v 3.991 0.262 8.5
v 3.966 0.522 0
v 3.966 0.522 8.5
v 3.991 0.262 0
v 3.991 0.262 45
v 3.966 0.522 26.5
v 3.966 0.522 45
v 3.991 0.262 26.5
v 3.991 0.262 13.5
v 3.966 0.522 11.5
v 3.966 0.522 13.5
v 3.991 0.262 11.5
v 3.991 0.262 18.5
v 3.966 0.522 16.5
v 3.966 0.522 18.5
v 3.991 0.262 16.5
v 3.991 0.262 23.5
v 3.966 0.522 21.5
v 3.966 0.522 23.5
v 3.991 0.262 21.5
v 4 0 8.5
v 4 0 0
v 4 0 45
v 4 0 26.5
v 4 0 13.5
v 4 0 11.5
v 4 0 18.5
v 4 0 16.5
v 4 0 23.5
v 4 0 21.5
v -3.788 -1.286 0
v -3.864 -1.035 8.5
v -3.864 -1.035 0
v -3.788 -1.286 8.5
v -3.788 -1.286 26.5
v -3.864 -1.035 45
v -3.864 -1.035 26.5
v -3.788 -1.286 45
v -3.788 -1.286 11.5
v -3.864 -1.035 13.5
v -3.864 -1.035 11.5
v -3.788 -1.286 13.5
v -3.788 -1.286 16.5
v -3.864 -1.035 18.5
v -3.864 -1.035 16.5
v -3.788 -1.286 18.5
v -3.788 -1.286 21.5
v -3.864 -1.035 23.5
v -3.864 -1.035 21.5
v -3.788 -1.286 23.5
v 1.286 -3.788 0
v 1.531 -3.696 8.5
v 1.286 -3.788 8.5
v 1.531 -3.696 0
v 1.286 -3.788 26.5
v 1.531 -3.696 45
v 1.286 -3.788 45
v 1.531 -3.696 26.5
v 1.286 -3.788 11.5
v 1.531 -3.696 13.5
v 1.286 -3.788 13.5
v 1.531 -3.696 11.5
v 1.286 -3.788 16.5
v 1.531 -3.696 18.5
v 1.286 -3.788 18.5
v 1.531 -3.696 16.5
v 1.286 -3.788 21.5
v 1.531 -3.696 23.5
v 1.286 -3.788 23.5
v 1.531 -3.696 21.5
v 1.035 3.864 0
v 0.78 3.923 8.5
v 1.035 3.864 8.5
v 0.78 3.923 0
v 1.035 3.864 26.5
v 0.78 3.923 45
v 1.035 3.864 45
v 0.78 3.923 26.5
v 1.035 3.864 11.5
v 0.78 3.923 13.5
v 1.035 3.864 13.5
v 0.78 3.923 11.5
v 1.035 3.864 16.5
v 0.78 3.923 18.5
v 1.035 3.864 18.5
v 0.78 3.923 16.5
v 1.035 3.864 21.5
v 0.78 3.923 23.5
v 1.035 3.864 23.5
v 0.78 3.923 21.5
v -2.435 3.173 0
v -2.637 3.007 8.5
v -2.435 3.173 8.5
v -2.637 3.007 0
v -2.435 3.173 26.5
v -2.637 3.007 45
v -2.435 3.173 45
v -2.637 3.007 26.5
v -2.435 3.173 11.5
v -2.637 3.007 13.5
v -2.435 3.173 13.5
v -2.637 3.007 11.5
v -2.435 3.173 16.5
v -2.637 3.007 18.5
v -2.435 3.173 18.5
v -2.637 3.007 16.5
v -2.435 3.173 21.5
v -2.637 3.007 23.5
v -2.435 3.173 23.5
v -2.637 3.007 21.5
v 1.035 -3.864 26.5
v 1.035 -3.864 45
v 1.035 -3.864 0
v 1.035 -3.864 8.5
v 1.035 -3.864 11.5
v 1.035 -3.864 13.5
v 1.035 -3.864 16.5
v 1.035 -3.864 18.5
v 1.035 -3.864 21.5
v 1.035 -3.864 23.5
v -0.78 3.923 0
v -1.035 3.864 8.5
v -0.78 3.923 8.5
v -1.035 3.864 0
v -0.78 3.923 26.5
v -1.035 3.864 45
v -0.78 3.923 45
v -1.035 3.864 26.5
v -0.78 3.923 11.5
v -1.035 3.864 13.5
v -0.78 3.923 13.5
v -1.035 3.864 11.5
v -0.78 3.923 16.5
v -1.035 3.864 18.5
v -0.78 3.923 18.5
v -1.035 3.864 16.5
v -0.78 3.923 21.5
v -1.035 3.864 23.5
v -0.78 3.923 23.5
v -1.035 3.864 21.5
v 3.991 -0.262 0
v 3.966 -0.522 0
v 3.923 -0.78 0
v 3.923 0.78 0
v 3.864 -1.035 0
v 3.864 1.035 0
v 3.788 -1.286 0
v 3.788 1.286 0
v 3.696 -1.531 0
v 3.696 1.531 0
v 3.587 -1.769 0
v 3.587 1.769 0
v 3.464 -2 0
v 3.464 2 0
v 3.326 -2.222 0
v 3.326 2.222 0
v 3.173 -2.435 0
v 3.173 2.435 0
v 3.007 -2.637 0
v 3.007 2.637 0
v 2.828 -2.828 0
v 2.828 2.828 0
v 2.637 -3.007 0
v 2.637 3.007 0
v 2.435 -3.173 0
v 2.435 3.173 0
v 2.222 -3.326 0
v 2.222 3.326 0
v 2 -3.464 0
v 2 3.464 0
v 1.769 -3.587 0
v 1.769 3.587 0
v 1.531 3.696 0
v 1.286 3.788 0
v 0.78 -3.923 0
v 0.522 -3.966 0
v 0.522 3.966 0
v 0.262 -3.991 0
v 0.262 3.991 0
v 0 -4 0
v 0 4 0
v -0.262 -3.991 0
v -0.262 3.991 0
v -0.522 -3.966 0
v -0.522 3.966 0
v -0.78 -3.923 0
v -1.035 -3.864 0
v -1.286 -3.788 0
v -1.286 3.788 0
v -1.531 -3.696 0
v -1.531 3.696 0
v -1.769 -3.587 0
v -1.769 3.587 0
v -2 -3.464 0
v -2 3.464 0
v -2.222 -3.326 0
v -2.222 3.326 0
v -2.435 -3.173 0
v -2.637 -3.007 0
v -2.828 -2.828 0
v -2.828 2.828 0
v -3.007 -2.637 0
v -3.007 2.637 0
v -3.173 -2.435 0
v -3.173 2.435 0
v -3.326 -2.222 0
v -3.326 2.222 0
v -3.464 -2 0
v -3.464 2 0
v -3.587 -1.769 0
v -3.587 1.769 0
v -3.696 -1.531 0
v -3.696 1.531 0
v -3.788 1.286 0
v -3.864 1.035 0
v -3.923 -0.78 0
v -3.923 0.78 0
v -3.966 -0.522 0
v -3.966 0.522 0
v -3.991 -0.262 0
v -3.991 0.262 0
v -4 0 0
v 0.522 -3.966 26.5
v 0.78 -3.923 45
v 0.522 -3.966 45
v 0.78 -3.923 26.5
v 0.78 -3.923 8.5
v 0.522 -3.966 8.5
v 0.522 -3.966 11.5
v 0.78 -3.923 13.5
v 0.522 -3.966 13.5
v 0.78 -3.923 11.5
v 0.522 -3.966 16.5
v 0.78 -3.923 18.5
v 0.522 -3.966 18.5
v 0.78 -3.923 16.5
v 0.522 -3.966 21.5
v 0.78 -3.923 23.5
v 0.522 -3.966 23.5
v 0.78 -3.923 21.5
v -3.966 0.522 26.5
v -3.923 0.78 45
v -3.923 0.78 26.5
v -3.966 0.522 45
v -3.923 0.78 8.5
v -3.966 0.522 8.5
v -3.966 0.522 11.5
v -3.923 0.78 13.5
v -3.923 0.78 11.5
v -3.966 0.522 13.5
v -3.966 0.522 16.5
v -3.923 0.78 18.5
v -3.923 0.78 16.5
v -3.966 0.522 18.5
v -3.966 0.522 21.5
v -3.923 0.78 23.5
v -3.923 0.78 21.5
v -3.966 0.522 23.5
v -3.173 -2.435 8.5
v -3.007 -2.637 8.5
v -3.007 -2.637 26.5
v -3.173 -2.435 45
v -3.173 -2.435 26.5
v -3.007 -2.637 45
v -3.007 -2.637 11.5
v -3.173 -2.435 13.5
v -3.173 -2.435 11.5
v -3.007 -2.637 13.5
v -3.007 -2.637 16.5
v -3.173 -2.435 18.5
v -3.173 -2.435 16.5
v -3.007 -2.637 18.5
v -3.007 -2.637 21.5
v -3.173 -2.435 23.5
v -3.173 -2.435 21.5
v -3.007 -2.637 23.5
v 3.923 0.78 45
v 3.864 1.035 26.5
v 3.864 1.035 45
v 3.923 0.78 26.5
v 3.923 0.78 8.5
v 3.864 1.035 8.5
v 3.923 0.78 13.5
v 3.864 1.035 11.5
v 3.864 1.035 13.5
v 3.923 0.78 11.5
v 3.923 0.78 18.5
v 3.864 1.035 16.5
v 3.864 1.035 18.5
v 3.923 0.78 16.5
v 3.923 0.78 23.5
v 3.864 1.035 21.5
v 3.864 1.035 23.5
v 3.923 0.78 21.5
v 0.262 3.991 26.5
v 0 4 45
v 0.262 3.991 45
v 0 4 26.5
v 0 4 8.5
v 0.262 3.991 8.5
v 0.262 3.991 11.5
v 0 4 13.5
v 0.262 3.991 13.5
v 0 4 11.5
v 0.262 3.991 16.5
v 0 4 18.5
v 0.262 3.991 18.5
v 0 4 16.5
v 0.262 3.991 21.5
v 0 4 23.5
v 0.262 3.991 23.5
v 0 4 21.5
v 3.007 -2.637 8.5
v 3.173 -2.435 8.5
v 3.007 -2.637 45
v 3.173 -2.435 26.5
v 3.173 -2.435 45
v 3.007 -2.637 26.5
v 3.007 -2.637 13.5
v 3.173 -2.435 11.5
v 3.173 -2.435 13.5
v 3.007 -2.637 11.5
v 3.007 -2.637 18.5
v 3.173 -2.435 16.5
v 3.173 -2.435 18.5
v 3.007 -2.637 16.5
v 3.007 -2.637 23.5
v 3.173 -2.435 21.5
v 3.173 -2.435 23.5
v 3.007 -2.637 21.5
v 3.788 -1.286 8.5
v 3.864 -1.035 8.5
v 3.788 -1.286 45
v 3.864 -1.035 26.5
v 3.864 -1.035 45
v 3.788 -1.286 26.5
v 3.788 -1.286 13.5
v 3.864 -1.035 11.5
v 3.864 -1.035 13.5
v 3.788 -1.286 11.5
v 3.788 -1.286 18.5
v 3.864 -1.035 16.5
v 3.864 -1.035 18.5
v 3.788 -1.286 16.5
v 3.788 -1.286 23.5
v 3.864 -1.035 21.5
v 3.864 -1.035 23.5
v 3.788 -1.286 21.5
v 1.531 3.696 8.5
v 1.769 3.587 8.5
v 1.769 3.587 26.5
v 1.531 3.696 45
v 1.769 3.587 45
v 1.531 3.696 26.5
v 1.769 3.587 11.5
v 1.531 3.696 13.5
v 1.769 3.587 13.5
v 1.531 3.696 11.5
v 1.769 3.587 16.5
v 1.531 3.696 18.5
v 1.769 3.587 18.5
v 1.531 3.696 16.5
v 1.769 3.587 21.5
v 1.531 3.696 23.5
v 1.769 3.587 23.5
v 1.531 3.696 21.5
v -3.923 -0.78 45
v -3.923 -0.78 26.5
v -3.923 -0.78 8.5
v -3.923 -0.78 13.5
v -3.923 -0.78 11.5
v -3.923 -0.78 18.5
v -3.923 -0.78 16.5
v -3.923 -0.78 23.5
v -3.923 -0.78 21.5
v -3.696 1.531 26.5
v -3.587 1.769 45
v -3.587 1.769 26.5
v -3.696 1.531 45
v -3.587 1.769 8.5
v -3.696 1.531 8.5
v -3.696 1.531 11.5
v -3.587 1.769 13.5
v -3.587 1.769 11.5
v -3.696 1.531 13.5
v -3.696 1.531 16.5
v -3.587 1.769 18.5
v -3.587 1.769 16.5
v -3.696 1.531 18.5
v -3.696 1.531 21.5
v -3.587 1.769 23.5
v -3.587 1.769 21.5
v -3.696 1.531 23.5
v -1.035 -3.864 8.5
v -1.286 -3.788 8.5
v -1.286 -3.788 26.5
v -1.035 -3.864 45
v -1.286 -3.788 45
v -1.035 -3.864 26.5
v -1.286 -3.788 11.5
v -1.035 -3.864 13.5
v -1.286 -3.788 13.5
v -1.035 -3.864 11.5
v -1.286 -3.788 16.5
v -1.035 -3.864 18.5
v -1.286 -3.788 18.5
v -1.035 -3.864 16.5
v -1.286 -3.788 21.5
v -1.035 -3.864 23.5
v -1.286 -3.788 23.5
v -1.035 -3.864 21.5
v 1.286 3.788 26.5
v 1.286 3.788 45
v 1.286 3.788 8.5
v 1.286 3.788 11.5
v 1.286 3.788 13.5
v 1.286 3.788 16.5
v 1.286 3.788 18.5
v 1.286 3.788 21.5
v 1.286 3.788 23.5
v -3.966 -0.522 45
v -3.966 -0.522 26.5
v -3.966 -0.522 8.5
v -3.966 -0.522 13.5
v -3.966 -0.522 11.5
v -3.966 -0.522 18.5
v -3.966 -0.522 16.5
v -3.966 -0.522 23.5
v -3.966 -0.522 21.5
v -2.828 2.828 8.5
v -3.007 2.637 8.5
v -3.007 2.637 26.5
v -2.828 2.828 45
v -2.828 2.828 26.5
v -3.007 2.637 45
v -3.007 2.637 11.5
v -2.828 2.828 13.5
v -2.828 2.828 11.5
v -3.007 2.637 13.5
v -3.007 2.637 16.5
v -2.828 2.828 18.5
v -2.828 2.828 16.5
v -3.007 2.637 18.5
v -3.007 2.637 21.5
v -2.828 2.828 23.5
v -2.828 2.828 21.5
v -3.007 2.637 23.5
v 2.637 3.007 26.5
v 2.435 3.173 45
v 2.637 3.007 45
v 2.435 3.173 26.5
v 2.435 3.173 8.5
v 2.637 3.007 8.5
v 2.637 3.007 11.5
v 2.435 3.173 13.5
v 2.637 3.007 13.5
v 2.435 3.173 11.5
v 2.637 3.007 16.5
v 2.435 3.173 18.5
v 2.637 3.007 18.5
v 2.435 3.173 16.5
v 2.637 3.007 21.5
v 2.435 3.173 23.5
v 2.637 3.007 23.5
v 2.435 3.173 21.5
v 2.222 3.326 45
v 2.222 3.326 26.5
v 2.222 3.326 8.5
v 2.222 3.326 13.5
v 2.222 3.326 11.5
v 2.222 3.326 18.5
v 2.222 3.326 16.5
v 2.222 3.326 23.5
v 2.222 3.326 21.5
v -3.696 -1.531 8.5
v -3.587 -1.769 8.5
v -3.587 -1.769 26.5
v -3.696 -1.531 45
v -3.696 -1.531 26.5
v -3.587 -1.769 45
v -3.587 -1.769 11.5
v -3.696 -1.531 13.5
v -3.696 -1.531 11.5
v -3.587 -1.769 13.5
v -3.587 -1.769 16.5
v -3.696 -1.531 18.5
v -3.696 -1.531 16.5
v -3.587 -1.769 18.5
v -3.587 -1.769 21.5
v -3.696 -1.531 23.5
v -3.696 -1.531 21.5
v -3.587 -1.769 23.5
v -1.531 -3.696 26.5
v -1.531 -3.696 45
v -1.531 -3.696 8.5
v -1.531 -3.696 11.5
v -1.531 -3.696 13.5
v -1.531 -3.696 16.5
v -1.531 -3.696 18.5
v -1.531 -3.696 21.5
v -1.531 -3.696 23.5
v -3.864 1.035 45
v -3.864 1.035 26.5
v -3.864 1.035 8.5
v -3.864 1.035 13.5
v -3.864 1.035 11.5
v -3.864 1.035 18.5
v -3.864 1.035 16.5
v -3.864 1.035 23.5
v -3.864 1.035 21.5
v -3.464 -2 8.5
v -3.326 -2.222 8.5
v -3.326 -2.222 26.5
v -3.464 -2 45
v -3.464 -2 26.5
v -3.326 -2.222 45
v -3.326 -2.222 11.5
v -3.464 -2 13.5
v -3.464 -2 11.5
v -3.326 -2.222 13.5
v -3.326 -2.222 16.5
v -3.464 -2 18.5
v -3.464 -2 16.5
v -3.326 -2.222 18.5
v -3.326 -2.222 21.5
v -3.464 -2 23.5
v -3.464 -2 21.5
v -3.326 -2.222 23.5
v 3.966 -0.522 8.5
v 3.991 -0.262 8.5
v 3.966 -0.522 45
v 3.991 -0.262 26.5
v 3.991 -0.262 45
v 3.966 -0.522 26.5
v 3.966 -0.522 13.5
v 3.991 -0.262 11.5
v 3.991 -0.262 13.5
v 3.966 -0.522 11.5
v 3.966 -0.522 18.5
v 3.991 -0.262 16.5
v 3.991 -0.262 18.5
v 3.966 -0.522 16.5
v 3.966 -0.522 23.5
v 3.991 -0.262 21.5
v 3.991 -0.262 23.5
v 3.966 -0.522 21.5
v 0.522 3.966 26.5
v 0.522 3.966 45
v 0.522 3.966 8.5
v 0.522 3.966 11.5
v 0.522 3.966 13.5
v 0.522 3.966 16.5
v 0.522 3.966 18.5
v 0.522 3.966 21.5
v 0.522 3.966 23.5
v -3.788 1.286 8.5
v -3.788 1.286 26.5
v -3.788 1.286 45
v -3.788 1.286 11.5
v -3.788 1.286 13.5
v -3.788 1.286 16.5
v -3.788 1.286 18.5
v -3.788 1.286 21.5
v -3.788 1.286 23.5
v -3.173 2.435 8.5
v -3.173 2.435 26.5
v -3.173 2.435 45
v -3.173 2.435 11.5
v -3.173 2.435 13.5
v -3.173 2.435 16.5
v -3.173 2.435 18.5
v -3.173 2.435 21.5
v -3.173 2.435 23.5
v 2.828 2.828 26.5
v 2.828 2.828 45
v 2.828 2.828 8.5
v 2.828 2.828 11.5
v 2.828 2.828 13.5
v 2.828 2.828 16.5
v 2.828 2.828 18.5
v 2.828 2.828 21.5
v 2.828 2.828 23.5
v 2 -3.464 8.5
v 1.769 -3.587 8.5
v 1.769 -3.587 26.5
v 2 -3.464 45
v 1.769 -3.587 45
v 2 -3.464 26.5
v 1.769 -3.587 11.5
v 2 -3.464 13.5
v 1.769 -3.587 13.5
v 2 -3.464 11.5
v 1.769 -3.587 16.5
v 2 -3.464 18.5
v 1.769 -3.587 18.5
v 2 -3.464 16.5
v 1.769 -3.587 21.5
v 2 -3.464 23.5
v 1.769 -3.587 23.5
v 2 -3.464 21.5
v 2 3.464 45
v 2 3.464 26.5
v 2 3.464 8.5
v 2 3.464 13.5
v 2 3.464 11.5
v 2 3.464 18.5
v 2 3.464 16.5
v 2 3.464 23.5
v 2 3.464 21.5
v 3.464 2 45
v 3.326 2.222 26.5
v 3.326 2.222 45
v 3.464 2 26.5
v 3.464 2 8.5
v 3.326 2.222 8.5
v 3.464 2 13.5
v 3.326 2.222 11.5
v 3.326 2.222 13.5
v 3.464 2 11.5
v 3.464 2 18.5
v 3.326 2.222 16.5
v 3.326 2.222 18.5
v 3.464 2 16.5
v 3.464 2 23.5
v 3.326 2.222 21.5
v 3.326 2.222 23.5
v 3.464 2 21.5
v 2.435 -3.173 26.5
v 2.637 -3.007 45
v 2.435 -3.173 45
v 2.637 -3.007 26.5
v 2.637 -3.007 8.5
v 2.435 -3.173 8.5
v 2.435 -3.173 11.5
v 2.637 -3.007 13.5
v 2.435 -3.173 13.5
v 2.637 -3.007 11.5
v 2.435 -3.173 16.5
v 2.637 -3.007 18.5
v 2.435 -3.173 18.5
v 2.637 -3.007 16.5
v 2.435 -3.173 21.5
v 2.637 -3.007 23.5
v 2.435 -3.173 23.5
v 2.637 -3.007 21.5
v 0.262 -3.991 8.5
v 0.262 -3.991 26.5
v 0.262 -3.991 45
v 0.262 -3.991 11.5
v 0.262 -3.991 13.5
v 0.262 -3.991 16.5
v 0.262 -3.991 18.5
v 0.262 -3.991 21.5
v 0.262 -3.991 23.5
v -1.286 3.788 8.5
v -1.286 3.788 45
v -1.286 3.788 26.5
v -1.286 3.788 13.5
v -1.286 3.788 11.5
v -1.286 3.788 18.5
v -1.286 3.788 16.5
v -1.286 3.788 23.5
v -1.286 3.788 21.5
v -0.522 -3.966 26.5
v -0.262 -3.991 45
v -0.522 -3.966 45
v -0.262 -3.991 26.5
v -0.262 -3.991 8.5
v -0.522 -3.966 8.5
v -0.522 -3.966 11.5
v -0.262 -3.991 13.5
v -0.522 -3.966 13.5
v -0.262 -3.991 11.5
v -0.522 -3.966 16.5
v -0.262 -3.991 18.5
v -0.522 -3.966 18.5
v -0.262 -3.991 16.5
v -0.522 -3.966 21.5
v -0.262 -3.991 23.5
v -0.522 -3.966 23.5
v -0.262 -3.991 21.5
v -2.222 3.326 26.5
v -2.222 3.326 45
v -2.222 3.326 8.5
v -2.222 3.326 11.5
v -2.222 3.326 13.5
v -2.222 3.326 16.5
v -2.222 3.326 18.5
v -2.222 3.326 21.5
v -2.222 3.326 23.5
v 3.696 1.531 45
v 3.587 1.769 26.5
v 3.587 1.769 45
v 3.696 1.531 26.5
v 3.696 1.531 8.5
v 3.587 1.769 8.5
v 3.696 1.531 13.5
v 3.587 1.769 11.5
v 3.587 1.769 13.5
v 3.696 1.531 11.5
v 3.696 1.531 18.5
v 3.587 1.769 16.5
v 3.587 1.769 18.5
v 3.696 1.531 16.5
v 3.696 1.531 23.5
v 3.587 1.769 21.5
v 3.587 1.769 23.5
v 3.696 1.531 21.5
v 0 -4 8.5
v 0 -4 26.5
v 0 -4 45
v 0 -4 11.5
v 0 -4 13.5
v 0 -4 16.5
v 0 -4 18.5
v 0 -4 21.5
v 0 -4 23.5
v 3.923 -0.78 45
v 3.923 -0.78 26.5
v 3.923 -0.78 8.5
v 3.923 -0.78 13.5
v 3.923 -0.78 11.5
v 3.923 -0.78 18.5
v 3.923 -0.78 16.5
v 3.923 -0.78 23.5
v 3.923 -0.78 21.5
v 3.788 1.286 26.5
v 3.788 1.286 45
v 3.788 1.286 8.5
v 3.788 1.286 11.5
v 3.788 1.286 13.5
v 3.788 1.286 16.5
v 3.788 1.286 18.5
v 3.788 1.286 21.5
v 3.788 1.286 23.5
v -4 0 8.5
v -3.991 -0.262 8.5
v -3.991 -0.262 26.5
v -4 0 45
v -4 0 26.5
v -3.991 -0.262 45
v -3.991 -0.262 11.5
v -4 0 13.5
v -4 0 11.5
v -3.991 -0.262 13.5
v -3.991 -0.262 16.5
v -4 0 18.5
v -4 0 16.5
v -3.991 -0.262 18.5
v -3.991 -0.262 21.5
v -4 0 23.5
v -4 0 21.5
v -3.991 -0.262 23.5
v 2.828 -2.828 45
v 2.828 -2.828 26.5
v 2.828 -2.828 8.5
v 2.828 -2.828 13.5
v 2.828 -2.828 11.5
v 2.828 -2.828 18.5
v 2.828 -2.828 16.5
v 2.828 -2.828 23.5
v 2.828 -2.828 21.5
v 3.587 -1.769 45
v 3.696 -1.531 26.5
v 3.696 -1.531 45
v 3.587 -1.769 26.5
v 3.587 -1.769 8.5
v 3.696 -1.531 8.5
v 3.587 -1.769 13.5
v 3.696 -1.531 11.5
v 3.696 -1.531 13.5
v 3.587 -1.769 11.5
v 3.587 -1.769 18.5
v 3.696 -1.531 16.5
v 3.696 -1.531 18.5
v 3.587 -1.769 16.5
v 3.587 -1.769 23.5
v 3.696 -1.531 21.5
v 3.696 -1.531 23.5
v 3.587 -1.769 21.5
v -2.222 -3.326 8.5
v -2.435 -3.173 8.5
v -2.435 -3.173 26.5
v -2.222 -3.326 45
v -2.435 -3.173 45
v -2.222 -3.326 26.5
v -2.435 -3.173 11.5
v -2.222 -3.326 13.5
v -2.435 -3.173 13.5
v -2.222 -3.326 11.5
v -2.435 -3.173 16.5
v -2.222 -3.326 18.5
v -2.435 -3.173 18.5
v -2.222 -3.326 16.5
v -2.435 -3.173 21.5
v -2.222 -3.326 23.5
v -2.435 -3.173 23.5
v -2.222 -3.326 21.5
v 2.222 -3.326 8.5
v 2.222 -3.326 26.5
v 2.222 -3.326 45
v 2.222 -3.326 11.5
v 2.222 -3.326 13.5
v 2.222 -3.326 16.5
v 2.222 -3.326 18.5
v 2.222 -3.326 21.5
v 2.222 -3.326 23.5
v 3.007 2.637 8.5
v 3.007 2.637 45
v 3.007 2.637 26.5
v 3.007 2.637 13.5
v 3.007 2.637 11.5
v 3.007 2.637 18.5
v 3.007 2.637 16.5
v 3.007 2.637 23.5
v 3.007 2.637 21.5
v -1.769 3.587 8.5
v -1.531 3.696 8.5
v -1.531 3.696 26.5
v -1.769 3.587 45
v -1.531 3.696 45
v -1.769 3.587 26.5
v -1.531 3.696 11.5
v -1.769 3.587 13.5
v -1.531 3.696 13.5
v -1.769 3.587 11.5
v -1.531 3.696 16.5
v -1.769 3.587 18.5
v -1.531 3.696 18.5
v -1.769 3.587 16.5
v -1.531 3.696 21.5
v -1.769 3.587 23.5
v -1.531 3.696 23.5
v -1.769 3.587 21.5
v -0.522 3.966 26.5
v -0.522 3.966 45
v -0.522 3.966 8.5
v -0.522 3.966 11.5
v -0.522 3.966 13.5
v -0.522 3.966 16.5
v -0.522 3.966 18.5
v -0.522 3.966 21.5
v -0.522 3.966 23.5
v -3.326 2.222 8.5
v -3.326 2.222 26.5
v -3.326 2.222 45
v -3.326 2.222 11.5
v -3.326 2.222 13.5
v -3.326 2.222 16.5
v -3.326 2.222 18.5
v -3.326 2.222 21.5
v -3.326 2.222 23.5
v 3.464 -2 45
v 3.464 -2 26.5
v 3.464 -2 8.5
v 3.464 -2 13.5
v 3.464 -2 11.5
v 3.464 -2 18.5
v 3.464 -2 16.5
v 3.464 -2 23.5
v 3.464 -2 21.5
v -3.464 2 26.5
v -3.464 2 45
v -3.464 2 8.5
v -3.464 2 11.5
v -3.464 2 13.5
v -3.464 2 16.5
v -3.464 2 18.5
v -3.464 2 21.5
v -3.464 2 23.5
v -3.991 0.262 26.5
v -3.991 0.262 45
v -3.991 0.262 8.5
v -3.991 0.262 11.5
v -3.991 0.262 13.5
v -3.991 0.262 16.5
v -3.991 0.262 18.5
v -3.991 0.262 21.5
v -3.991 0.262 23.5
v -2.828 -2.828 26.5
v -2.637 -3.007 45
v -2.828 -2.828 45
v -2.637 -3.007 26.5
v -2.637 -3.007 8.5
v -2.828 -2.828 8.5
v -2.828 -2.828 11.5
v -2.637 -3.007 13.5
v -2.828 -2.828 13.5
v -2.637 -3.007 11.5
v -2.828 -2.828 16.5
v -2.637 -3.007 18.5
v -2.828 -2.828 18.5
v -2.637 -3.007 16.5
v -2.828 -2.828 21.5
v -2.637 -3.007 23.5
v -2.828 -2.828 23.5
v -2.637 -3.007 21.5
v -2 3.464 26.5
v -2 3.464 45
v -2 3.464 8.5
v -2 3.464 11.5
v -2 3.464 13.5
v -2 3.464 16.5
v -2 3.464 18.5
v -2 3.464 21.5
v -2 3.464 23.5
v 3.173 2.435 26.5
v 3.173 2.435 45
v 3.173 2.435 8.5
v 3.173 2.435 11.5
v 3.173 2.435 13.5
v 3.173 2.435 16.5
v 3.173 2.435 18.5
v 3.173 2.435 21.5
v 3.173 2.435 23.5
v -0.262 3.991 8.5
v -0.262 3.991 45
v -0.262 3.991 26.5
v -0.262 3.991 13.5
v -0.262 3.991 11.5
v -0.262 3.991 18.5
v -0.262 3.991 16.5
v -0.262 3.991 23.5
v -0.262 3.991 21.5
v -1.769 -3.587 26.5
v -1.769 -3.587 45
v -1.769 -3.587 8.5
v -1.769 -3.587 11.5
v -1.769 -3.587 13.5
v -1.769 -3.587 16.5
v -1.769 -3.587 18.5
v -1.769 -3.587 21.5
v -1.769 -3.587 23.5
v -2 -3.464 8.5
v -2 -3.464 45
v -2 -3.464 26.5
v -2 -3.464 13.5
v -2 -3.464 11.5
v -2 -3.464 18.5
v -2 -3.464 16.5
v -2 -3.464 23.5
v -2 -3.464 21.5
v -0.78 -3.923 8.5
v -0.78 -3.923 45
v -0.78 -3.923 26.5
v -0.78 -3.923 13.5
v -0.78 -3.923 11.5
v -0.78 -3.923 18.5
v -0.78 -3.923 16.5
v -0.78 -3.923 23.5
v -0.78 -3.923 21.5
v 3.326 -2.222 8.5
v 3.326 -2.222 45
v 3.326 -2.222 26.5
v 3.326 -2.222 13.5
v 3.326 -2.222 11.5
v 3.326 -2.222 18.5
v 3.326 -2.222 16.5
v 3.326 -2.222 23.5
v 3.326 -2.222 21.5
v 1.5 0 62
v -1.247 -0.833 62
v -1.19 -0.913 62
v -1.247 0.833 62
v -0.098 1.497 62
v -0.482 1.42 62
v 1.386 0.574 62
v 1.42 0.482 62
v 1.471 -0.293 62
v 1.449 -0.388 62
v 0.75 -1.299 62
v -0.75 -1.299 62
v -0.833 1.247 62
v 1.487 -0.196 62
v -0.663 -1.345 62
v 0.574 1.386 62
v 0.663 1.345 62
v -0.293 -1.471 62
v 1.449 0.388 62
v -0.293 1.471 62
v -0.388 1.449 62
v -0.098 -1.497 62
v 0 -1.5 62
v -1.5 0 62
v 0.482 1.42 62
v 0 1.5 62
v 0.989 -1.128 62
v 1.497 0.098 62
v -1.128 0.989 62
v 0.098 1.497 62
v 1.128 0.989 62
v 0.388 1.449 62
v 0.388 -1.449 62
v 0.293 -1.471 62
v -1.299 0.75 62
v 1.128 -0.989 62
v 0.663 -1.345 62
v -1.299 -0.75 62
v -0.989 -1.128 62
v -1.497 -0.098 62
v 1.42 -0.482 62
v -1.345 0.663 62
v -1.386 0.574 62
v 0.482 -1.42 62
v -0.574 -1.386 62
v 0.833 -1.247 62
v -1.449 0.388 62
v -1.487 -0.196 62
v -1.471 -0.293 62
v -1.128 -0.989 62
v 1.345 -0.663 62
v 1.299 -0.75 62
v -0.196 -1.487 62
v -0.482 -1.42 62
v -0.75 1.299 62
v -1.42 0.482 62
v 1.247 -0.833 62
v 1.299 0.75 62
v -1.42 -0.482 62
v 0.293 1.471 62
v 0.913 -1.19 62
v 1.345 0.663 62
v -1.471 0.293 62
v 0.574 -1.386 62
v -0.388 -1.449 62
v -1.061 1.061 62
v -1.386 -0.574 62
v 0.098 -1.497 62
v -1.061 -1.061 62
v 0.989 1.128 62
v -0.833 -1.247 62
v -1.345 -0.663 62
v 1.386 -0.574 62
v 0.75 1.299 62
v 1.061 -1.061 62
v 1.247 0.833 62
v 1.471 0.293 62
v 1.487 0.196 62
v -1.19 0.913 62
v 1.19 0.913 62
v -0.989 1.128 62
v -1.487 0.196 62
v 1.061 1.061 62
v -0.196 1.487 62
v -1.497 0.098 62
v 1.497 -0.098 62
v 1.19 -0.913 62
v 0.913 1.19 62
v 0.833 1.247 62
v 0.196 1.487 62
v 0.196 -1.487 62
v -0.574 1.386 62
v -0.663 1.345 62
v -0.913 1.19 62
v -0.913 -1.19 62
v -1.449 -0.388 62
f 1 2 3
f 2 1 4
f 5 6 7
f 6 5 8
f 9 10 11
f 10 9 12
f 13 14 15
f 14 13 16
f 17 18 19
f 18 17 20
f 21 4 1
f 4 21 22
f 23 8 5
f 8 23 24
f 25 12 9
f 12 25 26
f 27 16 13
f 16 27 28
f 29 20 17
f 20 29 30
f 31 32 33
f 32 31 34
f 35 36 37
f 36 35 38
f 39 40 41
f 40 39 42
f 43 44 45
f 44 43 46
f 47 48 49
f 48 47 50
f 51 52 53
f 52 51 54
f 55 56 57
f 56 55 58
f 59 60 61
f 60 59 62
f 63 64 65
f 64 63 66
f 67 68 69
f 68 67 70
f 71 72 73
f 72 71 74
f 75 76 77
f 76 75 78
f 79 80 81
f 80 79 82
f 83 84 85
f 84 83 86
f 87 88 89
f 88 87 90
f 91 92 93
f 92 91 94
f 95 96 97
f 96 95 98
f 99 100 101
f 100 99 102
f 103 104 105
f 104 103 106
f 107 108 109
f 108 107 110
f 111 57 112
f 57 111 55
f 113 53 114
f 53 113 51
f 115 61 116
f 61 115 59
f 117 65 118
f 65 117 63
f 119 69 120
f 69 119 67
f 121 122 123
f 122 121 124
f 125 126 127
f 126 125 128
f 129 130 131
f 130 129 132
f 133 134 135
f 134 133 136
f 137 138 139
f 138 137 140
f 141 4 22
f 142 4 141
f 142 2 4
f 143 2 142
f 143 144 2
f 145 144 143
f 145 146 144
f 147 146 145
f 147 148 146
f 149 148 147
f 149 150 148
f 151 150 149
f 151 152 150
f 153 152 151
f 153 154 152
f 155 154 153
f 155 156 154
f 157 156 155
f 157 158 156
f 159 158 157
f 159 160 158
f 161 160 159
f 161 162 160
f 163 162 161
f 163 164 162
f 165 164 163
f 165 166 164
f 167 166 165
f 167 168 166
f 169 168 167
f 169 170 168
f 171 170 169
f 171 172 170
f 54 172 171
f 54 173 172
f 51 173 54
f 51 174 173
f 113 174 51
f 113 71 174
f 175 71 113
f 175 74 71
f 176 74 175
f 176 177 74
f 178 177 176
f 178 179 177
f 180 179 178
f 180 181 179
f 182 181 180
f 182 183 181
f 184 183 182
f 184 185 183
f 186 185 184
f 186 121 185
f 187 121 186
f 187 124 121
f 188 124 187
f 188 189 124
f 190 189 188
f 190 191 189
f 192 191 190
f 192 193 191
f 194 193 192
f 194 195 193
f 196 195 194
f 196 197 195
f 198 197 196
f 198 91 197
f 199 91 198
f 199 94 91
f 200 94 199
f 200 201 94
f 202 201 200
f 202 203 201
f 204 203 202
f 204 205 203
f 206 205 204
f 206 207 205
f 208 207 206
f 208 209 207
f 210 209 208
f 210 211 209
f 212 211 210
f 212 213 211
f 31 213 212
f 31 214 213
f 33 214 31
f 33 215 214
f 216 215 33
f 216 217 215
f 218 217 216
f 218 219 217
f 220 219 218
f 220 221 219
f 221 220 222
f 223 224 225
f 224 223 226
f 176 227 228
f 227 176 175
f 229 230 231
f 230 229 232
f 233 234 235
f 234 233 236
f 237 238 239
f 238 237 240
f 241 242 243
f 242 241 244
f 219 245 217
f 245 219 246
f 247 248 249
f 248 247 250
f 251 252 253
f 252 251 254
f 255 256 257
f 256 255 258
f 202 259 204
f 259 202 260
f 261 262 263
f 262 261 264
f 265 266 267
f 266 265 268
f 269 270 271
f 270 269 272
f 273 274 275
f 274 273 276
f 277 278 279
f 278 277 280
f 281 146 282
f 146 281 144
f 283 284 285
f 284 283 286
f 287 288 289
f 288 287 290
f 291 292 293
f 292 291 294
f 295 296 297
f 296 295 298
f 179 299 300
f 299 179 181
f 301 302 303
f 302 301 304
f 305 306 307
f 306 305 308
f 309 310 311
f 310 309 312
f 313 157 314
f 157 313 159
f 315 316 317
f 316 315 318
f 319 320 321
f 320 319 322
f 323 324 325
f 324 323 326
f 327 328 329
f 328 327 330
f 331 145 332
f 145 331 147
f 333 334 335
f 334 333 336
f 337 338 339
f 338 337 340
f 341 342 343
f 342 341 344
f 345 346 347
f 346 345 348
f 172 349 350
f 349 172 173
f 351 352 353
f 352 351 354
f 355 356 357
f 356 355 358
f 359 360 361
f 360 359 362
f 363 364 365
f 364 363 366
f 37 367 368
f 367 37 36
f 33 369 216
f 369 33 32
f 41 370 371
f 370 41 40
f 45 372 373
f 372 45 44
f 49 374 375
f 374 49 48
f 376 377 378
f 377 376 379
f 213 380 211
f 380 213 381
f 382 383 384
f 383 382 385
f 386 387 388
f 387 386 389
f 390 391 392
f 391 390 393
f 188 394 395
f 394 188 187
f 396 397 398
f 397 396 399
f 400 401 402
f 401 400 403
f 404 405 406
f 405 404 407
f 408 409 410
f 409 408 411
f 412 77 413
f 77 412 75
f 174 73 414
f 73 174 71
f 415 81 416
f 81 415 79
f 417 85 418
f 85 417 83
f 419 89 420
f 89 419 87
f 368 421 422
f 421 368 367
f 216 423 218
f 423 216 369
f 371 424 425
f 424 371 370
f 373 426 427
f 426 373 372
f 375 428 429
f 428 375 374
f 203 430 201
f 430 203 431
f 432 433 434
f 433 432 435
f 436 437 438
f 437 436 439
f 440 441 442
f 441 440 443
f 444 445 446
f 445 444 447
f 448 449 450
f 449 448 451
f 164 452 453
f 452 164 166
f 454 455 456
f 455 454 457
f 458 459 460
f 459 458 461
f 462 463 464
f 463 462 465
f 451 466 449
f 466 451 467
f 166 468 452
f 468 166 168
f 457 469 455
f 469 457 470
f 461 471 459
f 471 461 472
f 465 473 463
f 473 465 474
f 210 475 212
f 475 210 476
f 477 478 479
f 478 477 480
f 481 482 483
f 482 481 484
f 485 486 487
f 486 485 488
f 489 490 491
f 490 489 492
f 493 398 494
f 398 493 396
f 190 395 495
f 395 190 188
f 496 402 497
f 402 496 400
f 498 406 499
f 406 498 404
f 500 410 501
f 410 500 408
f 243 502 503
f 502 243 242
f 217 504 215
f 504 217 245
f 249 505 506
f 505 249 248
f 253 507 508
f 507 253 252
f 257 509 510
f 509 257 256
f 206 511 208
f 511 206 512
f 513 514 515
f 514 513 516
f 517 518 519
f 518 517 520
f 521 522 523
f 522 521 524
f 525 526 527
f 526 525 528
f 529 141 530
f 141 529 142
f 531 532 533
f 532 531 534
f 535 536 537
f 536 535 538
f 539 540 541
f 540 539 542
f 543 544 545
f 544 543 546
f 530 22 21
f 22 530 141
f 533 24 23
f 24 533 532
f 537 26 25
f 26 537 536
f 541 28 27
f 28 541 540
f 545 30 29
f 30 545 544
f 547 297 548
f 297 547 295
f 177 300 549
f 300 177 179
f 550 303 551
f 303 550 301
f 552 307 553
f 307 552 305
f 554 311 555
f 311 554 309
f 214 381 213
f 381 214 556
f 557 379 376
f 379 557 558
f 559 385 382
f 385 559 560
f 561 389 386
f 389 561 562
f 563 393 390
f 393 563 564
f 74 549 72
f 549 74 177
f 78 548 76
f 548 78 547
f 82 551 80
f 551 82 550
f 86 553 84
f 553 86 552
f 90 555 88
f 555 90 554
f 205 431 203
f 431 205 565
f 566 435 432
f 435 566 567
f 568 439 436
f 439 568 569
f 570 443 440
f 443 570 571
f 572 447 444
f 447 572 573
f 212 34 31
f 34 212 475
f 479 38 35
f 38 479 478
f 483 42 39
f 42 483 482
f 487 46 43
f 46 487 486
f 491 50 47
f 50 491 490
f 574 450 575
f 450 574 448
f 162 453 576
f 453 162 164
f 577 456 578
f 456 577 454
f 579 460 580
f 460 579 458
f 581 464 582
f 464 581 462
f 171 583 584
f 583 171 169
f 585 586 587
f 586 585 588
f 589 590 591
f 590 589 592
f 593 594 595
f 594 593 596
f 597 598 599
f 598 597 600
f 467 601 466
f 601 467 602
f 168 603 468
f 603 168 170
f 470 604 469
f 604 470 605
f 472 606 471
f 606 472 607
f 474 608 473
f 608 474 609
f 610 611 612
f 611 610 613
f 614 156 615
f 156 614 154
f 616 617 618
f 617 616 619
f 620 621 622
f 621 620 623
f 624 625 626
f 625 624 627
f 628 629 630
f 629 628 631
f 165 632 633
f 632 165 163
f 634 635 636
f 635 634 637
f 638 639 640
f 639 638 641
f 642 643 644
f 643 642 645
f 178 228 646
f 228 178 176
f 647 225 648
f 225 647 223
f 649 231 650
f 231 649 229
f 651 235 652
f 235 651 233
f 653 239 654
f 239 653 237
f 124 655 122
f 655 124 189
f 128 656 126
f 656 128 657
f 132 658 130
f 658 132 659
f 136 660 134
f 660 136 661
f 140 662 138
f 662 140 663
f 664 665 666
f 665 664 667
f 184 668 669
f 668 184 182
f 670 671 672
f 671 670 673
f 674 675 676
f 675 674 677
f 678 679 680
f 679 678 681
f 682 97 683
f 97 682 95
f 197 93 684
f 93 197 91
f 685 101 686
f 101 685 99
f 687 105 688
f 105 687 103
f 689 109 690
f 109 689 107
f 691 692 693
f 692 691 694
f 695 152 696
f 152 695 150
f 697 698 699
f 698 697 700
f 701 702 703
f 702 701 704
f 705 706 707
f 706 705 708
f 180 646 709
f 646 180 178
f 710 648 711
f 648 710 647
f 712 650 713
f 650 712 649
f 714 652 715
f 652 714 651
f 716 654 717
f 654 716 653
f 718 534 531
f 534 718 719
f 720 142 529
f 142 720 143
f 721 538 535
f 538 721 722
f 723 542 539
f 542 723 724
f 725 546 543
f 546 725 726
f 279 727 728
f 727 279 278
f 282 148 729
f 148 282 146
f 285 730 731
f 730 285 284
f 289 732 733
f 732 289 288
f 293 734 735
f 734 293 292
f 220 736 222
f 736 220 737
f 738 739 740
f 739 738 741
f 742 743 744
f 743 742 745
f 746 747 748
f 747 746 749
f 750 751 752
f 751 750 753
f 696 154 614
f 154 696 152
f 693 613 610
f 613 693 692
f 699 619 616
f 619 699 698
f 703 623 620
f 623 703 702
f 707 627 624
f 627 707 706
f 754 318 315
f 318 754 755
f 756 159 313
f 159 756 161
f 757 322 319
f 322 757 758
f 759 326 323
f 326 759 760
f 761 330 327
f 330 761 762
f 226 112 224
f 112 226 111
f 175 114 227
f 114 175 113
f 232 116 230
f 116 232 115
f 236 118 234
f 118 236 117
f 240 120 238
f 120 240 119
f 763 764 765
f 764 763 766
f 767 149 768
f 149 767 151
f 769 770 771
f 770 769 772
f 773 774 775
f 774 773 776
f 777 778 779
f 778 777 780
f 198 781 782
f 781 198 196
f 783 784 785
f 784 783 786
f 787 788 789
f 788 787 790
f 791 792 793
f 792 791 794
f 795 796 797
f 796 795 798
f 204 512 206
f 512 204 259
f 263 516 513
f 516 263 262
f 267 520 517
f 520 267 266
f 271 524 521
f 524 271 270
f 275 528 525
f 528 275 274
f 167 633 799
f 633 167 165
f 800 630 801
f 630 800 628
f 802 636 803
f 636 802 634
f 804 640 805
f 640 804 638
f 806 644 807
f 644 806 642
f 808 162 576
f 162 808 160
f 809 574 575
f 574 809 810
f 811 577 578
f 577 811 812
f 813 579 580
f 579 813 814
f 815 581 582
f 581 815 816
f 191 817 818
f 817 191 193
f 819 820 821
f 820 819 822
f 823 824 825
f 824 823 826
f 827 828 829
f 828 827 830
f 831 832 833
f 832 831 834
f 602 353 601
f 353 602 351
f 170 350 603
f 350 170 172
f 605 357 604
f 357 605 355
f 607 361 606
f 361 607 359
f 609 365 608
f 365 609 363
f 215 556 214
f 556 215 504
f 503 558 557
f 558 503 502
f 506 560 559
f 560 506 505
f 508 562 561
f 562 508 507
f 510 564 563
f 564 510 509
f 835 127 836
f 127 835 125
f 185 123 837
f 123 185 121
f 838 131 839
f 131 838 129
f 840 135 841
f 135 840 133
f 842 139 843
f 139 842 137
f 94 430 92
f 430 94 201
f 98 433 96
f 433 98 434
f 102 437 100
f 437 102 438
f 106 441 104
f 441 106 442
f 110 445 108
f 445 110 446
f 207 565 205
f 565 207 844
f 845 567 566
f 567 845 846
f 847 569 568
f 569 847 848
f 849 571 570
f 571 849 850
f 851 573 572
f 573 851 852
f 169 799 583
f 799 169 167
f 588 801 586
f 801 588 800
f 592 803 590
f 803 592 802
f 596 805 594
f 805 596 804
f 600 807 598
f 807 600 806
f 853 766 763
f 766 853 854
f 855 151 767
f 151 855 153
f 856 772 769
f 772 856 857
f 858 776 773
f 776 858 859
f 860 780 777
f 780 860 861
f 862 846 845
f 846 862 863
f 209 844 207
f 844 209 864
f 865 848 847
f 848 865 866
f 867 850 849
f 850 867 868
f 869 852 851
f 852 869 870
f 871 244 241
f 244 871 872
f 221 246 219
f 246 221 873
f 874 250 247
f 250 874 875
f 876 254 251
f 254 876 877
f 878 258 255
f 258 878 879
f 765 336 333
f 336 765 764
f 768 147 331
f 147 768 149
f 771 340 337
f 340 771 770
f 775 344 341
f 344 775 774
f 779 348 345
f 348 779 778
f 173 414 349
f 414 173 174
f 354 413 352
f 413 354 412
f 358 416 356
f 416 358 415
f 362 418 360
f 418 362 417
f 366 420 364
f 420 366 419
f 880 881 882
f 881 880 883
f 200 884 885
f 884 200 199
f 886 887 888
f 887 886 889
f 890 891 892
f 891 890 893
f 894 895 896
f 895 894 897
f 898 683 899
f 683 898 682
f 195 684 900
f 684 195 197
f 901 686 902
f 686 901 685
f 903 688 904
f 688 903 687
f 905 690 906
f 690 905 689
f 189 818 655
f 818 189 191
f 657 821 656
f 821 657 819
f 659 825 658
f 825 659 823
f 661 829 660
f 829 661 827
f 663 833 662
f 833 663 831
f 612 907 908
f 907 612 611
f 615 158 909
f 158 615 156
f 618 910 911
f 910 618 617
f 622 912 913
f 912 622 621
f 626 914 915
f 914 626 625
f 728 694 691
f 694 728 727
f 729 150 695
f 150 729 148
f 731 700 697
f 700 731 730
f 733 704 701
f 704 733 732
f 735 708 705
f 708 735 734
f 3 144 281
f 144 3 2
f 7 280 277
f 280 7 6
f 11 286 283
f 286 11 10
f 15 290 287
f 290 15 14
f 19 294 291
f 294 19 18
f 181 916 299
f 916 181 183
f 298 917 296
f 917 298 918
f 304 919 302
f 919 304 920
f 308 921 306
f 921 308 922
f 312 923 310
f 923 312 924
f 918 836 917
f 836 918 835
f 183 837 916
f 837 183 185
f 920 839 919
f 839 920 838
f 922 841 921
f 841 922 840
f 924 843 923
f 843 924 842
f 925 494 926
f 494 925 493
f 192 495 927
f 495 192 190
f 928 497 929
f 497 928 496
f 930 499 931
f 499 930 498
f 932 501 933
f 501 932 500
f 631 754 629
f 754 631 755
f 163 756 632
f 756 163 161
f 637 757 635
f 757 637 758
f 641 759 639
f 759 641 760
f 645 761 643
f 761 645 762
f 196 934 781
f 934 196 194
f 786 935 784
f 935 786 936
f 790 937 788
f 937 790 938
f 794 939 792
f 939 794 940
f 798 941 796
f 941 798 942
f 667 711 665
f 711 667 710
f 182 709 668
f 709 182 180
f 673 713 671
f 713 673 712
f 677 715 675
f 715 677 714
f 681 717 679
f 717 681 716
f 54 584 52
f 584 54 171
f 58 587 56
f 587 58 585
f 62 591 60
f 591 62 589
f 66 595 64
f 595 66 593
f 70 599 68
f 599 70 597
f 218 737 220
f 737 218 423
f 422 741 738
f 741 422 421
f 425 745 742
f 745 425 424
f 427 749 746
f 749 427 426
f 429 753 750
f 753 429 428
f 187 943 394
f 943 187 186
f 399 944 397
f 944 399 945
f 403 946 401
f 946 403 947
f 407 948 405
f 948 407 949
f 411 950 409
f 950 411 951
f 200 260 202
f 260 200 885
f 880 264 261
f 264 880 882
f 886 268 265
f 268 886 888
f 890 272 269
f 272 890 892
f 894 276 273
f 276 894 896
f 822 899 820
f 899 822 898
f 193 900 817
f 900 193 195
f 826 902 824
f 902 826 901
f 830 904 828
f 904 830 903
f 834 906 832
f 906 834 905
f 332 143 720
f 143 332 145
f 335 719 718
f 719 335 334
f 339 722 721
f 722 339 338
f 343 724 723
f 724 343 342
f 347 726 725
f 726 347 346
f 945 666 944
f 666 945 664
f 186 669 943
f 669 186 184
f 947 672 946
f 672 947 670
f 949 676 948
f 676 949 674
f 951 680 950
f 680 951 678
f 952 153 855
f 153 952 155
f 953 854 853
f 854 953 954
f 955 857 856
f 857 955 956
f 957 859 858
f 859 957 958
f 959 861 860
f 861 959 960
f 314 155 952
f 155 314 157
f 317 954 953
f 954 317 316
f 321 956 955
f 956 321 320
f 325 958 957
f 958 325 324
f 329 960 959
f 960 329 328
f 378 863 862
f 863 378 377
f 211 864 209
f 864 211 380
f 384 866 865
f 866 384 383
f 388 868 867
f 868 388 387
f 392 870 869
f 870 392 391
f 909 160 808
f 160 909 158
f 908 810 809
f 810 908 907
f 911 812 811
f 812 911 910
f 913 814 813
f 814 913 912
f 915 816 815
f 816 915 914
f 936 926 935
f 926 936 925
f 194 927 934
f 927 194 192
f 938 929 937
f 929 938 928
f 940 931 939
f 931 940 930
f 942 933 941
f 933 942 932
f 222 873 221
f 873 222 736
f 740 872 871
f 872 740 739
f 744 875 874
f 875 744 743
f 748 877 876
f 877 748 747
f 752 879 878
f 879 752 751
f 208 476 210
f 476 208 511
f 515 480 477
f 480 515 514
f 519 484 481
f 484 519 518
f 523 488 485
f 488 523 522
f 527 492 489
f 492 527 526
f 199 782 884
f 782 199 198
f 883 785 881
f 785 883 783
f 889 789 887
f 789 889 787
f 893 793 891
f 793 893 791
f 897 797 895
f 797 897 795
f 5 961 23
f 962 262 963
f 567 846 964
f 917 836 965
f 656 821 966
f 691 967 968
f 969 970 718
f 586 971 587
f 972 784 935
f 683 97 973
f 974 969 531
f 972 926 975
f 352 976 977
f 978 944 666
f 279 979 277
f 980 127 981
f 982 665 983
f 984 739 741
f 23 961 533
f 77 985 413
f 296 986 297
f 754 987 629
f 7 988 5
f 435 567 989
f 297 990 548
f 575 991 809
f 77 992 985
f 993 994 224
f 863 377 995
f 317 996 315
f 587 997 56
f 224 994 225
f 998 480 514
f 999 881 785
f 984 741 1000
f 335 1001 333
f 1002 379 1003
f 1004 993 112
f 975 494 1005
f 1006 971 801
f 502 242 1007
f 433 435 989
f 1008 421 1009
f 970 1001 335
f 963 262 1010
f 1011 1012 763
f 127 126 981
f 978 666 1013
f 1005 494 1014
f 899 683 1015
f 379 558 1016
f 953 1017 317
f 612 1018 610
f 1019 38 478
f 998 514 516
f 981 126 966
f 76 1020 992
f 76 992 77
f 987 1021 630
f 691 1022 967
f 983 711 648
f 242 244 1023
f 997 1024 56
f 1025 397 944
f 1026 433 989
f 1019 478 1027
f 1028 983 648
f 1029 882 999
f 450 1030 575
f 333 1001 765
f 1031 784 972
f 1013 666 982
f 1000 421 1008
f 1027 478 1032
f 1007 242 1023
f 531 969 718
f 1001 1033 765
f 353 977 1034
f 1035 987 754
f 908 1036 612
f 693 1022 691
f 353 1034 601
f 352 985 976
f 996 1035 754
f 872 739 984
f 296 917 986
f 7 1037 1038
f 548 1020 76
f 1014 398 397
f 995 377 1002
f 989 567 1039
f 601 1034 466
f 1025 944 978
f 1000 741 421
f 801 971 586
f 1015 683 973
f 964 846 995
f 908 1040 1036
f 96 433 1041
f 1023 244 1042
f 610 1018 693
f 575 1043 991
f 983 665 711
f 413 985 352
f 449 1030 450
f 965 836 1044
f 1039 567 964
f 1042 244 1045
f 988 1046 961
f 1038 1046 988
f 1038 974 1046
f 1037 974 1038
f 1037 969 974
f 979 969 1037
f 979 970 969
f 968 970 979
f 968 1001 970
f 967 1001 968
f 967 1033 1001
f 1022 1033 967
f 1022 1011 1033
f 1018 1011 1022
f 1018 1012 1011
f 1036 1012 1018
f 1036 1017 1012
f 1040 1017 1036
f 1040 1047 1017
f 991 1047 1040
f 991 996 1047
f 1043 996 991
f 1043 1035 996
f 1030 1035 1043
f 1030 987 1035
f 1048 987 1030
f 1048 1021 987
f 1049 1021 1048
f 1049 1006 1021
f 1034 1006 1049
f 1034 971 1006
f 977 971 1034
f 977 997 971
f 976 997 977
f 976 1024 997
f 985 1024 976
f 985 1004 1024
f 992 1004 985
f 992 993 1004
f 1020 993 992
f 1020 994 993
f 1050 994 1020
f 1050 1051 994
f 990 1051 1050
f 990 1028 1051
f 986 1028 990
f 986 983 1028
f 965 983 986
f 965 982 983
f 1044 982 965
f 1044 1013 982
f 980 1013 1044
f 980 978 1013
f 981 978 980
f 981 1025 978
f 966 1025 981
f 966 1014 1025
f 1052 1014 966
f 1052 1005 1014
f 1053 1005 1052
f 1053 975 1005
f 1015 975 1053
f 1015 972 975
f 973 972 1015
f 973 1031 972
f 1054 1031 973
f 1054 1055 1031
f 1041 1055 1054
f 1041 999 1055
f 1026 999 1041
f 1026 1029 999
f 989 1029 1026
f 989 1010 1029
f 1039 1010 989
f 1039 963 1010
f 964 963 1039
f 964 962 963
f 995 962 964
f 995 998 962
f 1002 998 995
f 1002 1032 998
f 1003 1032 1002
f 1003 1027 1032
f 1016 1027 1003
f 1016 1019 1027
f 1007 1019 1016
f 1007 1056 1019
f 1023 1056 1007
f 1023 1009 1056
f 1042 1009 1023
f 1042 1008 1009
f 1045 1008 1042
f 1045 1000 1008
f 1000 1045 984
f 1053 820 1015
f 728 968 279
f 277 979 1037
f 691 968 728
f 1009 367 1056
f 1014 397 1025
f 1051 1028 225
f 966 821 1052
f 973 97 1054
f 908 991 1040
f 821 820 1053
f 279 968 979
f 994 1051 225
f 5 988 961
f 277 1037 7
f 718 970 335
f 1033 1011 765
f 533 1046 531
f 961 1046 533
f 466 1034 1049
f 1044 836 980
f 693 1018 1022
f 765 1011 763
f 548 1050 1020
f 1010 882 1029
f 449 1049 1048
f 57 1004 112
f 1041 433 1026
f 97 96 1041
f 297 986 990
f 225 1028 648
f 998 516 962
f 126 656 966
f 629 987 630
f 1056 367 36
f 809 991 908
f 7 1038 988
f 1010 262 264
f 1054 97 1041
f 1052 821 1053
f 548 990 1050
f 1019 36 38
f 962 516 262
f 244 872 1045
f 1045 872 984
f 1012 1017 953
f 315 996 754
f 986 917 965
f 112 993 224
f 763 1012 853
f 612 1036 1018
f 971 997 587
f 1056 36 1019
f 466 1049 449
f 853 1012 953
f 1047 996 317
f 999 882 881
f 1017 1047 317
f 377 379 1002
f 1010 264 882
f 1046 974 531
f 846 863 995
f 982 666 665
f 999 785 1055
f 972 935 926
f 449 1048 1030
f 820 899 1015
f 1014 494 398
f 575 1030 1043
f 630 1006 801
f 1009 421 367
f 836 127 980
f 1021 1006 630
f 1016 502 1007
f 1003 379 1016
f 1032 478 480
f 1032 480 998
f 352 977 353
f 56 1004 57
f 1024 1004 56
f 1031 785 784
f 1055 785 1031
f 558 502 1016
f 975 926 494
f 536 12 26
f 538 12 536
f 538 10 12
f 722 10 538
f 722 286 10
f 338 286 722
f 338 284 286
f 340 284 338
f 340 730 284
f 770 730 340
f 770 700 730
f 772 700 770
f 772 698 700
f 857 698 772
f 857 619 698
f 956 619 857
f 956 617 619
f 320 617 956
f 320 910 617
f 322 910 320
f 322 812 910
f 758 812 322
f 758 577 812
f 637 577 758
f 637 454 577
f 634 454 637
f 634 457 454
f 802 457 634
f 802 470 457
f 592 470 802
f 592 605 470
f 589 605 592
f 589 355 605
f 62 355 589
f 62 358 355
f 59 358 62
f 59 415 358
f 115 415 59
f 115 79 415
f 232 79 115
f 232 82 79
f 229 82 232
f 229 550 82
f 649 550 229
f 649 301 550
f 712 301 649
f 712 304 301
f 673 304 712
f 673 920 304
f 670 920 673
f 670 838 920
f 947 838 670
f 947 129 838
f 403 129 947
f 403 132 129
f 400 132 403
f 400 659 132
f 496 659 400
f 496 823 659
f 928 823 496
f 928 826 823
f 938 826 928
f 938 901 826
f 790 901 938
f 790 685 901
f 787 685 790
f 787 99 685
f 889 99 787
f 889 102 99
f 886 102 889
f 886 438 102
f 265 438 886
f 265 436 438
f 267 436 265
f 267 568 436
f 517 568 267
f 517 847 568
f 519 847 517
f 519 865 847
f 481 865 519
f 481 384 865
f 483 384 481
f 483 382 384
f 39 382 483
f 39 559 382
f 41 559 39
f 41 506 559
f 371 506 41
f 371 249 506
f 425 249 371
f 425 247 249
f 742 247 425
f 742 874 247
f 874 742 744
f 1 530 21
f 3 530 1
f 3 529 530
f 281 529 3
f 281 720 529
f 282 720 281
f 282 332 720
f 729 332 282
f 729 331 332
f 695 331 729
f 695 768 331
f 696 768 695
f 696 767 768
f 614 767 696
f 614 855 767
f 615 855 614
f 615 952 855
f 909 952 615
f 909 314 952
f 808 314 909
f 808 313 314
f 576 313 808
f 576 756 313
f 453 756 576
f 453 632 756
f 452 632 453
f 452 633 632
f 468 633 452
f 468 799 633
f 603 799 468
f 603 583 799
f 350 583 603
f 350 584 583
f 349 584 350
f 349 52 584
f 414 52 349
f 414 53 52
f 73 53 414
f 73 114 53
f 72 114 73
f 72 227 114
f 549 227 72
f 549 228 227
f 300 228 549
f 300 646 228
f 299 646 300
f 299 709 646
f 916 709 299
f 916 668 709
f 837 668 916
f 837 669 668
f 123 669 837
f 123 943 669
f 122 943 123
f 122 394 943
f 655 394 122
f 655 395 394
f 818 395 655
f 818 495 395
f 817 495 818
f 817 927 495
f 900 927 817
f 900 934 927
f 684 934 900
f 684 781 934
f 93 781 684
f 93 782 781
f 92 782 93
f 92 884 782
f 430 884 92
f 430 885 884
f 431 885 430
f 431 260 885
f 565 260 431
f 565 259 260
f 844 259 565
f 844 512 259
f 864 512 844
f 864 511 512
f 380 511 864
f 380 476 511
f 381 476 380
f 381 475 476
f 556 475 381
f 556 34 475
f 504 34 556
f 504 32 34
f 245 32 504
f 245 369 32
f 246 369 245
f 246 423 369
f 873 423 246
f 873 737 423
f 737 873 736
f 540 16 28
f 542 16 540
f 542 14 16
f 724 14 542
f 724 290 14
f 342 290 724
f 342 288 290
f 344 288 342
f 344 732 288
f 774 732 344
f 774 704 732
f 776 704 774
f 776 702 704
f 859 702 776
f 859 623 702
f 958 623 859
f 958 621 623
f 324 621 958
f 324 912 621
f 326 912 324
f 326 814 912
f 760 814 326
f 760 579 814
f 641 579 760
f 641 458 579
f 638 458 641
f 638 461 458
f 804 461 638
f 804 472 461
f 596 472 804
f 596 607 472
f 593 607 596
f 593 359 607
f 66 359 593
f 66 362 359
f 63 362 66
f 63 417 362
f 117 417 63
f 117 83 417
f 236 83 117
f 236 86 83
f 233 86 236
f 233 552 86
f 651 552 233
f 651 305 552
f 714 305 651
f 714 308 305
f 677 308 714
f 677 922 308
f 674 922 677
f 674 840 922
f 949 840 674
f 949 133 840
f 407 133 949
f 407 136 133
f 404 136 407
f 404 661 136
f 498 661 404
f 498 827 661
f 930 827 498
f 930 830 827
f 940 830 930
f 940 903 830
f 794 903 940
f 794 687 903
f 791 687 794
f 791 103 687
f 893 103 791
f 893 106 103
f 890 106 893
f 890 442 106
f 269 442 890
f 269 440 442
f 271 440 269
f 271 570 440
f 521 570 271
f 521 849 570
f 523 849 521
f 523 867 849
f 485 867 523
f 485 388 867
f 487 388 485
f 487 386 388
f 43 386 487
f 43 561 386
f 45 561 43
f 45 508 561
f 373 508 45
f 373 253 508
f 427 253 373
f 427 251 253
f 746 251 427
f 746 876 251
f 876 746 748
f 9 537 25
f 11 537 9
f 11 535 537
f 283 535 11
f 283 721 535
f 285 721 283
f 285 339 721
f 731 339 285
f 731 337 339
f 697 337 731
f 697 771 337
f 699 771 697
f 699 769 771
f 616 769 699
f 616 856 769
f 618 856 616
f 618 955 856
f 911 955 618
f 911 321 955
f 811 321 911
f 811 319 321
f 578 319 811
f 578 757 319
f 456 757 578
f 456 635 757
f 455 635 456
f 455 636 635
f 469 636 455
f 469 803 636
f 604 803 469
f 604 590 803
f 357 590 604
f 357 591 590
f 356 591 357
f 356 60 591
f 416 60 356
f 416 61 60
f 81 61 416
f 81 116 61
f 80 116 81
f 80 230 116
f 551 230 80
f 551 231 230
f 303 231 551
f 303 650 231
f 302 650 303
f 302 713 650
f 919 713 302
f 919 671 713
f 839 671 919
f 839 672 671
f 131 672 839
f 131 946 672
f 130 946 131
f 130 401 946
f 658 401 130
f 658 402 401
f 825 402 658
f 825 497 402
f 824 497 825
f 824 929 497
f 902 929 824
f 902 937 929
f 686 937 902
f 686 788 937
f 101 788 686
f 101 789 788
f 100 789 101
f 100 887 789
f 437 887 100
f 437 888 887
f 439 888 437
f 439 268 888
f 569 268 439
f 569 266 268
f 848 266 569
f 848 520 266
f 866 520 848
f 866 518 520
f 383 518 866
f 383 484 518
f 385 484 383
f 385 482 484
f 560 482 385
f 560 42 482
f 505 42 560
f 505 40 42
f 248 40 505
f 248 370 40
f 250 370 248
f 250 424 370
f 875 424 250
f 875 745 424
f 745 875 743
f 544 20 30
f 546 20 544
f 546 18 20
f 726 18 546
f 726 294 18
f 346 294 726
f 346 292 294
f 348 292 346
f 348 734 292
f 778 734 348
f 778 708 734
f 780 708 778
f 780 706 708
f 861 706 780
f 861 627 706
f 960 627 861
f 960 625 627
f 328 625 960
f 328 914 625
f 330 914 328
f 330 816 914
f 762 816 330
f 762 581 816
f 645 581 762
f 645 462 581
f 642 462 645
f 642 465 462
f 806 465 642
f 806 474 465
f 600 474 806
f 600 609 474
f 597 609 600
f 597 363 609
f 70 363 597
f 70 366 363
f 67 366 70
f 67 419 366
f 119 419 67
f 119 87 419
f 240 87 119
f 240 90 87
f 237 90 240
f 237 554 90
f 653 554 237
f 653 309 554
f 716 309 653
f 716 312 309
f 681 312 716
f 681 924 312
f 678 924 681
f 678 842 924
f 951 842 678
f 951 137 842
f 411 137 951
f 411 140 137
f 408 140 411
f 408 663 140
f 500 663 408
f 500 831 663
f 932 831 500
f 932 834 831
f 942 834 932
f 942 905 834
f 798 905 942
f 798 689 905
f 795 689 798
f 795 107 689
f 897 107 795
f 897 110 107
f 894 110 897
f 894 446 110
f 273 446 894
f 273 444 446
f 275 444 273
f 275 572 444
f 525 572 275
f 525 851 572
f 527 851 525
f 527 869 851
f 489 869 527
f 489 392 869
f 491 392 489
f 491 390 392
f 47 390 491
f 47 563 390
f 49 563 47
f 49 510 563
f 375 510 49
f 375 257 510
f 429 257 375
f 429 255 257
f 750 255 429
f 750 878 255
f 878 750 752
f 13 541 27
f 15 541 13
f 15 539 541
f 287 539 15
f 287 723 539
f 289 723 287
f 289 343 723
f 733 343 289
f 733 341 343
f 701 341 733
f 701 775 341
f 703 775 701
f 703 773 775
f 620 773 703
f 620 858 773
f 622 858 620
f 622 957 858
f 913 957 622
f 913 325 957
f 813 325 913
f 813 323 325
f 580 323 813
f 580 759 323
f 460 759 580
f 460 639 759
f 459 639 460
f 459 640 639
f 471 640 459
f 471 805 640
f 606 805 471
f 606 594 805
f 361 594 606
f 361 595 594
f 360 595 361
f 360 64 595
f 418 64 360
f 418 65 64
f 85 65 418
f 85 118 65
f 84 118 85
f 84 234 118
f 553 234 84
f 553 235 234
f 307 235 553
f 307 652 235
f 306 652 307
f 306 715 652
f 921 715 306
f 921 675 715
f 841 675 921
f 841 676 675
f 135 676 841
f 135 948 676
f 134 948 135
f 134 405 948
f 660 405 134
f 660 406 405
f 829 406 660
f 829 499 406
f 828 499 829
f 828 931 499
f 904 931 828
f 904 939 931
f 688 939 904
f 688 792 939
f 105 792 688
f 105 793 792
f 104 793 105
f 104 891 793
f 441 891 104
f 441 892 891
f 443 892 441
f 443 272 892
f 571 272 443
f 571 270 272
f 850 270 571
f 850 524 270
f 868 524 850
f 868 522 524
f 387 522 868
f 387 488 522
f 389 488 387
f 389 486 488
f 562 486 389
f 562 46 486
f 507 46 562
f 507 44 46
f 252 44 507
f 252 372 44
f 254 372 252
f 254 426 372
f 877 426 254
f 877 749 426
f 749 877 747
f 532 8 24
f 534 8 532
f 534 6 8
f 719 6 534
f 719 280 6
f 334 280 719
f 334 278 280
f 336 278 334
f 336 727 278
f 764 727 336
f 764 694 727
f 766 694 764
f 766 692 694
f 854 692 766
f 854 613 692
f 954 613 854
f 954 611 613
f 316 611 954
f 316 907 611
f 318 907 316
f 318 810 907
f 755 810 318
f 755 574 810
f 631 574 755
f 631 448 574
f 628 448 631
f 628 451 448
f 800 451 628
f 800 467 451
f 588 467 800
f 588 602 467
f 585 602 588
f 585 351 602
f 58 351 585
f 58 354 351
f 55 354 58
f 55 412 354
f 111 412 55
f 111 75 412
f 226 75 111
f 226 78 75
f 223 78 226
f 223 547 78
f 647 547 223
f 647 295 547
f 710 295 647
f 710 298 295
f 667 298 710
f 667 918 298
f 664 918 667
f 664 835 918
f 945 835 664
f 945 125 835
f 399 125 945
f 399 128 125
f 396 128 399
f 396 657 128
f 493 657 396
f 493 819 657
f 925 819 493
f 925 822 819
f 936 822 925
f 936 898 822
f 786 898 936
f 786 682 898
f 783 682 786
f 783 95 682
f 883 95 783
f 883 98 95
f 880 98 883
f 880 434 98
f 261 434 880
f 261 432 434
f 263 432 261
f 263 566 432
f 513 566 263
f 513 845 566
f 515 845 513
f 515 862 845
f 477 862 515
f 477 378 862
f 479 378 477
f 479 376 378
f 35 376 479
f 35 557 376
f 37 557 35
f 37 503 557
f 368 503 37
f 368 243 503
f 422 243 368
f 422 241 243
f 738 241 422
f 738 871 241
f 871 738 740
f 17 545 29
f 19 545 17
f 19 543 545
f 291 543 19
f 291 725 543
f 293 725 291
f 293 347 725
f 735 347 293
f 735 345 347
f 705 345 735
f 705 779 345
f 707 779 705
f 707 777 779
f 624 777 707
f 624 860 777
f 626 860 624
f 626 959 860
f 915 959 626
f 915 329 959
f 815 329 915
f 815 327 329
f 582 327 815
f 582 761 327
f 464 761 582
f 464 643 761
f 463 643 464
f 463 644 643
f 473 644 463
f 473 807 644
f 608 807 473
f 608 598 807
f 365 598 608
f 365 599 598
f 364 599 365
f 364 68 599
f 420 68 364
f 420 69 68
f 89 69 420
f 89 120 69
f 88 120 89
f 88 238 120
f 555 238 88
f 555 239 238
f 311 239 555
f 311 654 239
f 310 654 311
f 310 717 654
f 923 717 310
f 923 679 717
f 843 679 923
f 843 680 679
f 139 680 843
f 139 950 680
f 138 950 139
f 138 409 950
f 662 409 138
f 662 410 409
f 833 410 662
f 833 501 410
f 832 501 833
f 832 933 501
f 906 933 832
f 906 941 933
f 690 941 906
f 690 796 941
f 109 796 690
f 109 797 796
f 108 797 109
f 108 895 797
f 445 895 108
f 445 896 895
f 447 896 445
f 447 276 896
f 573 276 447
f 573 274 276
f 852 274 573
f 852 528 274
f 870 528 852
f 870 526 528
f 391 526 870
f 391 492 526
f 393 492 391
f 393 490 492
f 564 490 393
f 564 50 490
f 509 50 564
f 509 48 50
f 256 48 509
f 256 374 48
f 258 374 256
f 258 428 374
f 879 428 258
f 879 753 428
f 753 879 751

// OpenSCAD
// Pestle for 1.5 mL microcentrifuge tube
// Print orientation: standing upright on the bed (z = 0)

// ---------- Parameters ----------
handle_d      = 8;    // handle diameter (mm)
handle_h      = 45;   // handle height (mm), z = 0 to 45
cone_d        = 3;    // tip diameter (mm), reached at z = 62
tip_z         = 62;   // tip sphere centre height (mm)
tip_r         = cone_d / 2; // tip radius (mm)
groove_count  = 4;    // number of circumferential grooves
groove_w      = 2;    // groove width along Z (mm)
groove_depth  = 1;    // groove depth (mm)
groove_z      = [10, 15, 20, 25]; // groove centre heights (mm)
eps           = 0.5;  // overshoot for clean cuts (mm)

$fn = 96;

// ---------- Model ----------
difference() {
    union() {
        // Handle
        cylinder(d = handle_d, h = handle_h);

        // Cone: 8 mm diameter at z = 45 tapering to 3 mm at z = 62
        translate([0, 0, handle_h])
            cylinder(d1 = handle_d, d2 = cone_d, h = tip_z - handle_h);

        // Rounded tip: 3 mm diameter sphere centred at z = 62
        translate([0, 0, tip_z - tip_r])
            sphere(r = tip_r);
    }

    // Grip grooves, each extending past the faces it cuts
    for (g = [0 : groove_count - 1]) {
        z = groove_z[g];
        translate([0, 0, z - groove_w / 2 - eps])
            cylinder(d = handle_d + 2 * eps, h = groove_w + 2 * eps);
    }
}
